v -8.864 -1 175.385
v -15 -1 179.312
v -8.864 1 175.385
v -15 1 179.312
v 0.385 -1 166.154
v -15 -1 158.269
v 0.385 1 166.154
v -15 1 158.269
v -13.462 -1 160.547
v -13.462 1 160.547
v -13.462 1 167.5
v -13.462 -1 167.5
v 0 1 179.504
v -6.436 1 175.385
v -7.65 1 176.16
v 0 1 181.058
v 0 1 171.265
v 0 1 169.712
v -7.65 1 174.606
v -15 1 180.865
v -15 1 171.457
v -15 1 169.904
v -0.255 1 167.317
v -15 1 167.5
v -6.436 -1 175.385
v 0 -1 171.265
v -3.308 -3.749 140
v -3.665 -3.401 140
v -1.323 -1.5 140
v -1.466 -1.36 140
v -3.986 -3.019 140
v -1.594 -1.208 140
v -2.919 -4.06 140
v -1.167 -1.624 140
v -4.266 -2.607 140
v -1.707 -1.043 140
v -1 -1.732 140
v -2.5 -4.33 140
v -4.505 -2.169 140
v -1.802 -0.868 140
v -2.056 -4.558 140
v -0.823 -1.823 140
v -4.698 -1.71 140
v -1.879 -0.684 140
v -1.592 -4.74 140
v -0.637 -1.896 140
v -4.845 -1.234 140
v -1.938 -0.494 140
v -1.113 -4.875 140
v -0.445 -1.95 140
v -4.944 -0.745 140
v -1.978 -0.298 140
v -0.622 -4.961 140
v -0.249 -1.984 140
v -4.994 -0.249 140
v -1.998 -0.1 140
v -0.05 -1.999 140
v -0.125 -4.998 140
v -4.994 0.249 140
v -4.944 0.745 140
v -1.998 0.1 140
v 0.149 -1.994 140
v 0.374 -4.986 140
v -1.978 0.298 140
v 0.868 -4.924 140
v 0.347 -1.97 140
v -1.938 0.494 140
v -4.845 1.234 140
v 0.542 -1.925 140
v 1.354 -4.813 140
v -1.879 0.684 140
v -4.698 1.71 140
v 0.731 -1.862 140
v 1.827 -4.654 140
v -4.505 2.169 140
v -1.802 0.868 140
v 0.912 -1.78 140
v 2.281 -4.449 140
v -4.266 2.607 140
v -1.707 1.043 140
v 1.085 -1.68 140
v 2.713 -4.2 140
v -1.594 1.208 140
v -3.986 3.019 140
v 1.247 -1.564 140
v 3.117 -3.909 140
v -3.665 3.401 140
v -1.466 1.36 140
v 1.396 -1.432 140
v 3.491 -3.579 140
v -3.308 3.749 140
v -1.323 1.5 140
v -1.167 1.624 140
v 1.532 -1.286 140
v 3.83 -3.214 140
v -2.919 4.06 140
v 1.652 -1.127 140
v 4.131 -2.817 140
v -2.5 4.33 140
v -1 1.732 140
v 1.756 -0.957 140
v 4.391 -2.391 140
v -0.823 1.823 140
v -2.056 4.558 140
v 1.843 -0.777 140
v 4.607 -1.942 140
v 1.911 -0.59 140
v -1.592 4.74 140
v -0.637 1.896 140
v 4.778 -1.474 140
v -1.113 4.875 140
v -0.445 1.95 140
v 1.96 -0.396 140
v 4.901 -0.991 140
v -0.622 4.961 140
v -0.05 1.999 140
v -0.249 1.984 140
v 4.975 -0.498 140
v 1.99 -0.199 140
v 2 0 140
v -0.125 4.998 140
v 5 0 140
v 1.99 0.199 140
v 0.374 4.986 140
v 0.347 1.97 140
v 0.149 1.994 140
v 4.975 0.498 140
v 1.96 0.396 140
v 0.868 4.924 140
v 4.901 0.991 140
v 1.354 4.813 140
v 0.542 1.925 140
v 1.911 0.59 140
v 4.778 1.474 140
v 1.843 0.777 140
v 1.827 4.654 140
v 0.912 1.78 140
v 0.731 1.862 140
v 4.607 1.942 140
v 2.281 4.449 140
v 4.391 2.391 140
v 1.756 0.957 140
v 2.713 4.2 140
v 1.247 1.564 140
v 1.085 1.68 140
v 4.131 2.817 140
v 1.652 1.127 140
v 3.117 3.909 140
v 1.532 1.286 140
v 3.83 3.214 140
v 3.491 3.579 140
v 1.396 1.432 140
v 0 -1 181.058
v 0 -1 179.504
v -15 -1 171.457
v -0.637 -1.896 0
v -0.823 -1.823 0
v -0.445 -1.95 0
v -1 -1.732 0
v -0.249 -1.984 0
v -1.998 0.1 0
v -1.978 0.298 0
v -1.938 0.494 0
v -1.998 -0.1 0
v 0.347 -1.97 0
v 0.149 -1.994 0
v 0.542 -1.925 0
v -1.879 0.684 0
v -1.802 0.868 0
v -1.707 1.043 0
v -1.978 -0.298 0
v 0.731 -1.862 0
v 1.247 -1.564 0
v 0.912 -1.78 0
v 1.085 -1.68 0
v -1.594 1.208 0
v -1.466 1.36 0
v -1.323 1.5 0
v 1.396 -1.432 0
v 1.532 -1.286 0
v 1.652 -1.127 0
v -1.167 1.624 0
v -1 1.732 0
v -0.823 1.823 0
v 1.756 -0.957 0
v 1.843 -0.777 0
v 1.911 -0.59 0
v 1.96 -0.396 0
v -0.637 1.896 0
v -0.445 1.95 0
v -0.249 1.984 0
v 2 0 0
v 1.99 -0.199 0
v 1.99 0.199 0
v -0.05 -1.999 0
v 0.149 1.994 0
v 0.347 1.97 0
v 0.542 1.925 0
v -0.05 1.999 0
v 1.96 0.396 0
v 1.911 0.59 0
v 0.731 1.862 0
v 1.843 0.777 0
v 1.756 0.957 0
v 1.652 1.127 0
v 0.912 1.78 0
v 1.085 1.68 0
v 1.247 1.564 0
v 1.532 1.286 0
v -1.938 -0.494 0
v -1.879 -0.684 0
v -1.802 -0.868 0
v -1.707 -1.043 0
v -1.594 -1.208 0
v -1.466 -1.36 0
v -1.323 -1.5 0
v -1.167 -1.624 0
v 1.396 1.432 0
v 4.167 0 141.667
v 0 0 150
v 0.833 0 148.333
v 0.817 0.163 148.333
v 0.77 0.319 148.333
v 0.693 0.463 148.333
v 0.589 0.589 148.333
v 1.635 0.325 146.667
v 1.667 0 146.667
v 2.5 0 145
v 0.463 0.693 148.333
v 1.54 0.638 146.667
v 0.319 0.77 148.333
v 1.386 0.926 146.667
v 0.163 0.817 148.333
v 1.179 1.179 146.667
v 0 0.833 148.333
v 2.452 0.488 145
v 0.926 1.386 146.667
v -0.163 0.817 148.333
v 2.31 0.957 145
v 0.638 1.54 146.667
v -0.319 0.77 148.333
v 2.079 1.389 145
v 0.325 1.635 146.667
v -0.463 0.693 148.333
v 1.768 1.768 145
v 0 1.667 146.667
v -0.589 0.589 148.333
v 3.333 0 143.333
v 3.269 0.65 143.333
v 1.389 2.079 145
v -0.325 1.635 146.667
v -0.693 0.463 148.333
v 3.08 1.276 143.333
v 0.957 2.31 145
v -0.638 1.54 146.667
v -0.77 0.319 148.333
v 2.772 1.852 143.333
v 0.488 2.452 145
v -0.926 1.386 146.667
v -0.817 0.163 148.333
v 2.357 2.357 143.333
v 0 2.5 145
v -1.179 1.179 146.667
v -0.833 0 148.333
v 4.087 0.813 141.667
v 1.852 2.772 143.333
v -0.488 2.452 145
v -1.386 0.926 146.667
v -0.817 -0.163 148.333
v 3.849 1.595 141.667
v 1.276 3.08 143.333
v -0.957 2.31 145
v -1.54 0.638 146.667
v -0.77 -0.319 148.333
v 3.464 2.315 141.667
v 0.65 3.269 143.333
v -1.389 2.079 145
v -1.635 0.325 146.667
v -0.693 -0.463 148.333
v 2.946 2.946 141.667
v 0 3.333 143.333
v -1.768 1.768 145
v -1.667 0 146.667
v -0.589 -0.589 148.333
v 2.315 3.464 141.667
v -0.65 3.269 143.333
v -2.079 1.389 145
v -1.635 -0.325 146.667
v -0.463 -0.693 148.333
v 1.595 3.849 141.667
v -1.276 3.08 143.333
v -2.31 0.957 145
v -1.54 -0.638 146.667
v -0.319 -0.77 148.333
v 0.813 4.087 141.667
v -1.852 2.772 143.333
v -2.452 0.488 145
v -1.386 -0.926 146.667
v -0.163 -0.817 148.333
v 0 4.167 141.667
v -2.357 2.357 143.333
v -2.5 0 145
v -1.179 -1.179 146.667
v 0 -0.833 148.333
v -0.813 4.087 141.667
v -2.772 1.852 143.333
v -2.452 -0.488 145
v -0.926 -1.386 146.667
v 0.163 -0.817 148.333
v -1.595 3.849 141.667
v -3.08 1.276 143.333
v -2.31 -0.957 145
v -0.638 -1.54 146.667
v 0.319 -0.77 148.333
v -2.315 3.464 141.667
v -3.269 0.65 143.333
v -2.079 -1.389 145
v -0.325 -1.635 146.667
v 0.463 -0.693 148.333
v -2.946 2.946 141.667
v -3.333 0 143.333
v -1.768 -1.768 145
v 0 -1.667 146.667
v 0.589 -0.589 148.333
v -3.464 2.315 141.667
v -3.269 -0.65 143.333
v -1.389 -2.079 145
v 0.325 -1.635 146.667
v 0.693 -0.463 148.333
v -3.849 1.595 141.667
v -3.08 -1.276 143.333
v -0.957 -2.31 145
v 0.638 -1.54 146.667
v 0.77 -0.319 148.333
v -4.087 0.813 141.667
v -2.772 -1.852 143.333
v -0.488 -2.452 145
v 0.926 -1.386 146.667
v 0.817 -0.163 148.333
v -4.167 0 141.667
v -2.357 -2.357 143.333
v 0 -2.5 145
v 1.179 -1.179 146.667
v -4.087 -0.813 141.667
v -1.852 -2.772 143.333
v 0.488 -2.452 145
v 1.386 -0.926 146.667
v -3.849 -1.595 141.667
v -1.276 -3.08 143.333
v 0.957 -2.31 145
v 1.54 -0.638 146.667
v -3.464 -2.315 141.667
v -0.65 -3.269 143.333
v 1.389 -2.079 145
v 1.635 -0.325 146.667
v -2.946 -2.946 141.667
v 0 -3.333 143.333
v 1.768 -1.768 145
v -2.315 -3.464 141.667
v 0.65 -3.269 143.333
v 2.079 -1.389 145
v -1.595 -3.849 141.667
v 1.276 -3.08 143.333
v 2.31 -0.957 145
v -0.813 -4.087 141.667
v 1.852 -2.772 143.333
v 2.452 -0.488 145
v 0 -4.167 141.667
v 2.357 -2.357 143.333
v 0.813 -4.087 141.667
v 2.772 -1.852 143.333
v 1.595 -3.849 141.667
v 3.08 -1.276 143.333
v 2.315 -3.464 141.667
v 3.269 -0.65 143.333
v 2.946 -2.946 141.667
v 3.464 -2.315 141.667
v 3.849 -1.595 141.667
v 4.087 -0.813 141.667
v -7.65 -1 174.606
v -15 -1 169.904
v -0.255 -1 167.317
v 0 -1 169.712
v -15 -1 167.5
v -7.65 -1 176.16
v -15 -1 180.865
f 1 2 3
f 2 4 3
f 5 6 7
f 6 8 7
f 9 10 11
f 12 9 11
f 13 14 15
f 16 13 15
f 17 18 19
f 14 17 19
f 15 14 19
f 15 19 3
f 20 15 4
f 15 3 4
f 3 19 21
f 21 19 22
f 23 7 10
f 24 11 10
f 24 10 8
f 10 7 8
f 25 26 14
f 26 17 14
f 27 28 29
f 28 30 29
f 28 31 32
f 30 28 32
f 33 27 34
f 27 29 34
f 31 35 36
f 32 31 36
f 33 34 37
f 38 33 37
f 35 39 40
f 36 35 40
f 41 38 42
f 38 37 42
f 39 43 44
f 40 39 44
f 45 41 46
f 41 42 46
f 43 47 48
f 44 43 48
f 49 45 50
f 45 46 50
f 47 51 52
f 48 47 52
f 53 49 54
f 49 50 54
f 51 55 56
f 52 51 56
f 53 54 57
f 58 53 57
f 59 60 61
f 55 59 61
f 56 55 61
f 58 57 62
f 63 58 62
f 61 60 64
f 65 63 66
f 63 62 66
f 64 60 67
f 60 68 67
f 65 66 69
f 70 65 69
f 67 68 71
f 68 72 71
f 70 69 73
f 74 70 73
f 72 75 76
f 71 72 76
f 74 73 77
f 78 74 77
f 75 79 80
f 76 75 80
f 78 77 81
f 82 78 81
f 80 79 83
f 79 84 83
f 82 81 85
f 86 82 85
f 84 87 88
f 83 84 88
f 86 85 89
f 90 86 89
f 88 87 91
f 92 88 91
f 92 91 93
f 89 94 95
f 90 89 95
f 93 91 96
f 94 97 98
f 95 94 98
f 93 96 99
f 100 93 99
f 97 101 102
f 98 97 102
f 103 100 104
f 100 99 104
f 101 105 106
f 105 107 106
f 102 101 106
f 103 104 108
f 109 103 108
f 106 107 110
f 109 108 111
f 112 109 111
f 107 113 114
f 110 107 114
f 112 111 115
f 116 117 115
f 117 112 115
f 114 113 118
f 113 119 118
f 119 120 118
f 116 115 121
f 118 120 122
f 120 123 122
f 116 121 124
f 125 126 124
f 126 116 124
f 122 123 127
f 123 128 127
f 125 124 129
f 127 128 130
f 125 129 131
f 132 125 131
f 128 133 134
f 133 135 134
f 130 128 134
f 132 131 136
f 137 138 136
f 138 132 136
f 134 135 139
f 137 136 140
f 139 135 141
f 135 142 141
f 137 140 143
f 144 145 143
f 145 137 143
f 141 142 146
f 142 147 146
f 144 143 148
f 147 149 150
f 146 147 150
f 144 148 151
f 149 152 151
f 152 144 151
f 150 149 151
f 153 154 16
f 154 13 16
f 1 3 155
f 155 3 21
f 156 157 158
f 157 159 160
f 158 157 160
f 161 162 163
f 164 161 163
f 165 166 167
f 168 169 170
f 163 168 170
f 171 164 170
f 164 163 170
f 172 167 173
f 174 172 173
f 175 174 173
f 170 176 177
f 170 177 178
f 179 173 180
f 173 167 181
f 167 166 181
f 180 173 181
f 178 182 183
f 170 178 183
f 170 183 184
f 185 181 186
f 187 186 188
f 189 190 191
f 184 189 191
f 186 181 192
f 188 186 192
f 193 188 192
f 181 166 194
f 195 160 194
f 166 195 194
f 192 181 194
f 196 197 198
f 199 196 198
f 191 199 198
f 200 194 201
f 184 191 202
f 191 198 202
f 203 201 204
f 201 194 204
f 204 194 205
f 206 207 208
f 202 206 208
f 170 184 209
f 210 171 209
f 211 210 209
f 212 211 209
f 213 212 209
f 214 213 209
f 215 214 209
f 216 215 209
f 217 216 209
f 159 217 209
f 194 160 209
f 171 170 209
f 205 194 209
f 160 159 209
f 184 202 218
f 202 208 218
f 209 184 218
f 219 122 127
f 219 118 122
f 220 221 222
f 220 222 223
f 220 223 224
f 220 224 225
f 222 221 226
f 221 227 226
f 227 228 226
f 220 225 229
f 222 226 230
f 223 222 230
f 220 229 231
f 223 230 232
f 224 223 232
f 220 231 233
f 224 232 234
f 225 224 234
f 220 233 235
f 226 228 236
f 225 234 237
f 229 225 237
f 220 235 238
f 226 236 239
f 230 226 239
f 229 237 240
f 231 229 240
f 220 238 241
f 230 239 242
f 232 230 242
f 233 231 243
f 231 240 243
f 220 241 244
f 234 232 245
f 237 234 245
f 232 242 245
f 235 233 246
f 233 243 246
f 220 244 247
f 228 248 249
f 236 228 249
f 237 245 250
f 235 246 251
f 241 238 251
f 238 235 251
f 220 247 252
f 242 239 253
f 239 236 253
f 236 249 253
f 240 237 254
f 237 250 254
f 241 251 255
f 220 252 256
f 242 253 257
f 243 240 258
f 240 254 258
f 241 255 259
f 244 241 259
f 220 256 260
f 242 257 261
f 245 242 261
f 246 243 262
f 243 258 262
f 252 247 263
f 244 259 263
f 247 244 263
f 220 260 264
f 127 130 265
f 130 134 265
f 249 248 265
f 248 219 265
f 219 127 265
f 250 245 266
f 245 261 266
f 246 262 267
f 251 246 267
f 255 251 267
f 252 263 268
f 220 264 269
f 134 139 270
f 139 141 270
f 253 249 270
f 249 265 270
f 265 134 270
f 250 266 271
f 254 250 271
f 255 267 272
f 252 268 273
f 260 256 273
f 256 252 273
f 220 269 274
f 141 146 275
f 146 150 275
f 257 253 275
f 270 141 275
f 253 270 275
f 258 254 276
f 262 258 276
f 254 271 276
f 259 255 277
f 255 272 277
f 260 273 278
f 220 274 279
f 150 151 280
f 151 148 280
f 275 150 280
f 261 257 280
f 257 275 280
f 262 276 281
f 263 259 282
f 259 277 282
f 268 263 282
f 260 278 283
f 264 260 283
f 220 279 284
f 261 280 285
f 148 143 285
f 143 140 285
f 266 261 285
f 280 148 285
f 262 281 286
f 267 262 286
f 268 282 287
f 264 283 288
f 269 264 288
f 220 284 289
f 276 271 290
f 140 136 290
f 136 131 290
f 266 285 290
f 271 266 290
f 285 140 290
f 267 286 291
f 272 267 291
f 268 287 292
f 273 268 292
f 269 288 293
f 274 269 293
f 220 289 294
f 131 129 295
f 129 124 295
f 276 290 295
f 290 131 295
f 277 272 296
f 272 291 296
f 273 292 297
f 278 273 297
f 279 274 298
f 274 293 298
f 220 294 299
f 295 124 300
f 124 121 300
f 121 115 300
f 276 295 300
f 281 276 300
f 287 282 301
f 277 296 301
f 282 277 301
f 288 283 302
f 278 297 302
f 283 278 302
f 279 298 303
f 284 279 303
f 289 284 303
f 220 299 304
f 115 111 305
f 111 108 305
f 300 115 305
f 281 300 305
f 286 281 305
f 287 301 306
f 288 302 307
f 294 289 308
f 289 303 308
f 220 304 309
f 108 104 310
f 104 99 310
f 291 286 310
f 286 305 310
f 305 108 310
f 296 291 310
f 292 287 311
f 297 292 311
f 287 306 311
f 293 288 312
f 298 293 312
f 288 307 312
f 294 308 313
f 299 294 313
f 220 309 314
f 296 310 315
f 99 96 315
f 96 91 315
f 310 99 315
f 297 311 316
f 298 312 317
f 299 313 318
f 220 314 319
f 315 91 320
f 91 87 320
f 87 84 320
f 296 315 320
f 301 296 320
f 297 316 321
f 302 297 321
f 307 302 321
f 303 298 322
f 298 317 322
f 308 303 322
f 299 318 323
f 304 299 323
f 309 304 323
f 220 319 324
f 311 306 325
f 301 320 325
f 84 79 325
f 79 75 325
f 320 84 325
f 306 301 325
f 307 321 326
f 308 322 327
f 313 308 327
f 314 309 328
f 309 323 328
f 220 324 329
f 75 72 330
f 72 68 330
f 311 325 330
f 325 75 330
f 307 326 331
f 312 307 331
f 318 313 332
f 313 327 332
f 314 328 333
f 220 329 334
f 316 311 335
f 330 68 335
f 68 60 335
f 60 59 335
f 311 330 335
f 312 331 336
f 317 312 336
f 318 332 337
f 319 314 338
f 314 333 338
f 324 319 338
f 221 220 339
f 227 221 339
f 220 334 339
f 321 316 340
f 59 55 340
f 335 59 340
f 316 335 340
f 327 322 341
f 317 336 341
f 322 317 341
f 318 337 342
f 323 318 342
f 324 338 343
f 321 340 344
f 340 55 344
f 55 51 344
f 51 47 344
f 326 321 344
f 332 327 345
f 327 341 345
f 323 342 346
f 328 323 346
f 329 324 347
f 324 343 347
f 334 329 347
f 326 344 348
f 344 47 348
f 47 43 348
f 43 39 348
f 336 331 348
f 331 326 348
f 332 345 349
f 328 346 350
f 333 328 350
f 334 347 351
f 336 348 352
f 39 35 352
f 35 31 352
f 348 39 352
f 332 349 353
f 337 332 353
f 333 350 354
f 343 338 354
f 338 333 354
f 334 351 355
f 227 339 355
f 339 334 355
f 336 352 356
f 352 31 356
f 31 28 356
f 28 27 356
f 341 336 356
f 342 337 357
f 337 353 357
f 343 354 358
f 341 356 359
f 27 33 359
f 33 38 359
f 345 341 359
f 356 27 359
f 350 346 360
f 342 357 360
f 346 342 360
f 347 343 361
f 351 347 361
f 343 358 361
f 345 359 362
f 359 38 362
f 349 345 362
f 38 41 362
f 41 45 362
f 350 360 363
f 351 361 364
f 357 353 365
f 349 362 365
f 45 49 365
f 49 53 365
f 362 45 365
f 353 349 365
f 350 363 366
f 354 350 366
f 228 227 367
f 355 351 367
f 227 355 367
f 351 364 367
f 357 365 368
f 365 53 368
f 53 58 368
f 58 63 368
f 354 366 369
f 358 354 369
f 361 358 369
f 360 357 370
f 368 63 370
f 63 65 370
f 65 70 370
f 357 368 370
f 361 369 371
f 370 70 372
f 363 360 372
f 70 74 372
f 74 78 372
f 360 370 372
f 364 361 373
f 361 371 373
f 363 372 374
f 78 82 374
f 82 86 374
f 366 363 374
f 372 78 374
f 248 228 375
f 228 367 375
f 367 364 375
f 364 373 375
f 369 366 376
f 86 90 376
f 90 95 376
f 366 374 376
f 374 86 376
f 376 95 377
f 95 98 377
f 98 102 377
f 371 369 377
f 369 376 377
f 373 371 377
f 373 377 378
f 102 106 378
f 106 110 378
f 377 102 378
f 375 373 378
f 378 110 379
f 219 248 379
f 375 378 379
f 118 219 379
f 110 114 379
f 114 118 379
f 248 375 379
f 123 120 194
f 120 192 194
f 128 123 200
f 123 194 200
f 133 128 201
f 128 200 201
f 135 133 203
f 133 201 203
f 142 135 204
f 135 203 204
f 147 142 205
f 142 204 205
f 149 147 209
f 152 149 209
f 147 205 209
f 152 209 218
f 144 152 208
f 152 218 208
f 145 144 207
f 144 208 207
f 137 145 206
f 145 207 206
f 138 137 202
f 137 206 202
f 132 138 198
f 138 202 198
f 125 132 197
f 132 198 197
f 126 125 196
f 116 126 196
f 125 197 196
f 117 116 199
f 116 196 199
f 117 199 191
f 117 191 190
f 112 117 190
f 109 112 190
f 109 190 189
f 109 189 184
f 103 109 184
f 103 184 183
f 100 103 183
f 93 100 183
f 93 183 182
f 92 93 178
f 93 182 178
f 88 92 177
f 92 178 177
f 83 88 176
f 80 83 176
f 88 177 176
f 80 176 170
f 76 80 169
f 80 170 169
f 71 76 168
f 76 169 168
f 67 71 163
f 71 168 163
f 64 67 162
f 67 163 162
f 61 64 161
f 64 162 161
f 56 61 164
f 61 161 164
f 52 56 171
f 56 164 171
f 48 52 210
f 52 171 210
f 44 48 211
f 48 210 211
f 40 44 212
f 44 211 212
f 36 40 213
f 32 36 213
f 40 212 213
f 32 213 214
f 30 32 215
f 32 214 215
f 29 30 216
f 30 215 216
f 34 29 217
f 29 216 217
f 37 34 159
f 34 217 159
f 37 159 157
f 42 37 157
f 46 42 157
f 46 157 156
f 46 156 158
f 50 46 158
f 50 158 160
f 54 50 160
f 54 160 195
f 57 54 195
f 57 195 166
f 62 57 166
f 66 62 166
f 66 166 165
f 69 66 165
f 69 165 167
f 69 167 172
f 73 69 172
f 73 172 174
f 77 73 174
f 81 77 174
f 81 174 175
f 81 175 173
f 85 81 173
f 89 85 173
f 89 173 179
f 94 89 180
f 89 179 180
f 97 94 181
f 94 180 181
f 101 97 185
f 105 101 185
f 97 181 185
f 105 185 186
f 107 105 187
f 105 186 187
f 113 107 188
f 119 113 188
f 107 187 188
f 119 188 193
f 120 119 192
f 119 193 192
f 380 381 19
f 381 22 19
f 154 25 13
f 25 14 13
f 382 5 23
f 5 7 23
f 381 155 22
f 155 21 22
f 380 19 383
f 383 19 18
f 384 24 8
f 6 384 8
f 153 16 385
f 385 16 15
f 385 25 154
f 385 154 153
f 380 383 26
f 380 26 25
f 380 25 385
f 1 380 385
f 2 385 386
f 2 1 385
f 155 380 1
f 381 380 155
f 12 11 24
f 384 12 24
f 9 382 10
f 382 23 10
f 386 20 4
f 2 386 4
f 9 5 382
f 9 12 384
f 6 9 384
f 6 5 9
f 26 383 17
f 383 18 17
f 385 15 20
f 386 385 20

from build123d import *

# Parameters (mm, degrees)
BOSS_EXTRUDE1_DEPTH        = 1
BOSS_EXTRUDE1_DEPTH_BACK   = 1
BOSS_EXTRUDE1_2_DEPTH      = 1
BOSS_EXTRUDE1_2_DEPTH_BACK = 1


with BuildPart() as part:
    # Sketch2 → Revolve1 (revolve)
    with BuildSketch(Plane(origin=(0, 0, 0), x_dir=(1, 0, 0), z_dir=(0, 1, 0))):
        Polygon((0, -150), (5, -140), (2, -140), (2, 0), (0, 0), align=None)
    revolve(axis=Axis((0, 0, -41.949952025), (0, 0, 1)))


with BuildPart() as body_2:
    # Sketch3 → Boss-Extrude1 (new, two sides: drawn at the far end of the back side and taken through both)
    with BuildSketch(Plane(origin=(0, 0, 0), x_dir=(1, 0, 0), z_dir=(0, 1, 0)).offset(-BOSS_EXTRUDE1_DEPTH_BACK)):
        Polygon((-15, -167.5), (-15, -158.269230769), (0.384615385, -166.153846154), (-0.255408654, -167.316706731), (-13.461538462, -160.546875), (-13.461538462, -167.5), align=None)
    extrude(amount=BOSS_EXTRUDE1_DEPTH + BOSS_EXTRUDE1_DEPTH_BACK)


with BuildPart() as body_3:
    # Sketch3 → Boss-Extrude1 2 (new, two sides: drawn at the far end of the back side and taken through both)
    with BuildSketch(Plane(origin=(0, 0, 0), x_dir=(1, 0, 0), z_dir=(0, 1, 0)).offset(-BOSS_EXTRUDE1_2_DEPTH_BACK)):
        Polygon((-15, -180.865384615), (-15, -179.311899038), (-8.864182692, -175.384615385), (-15, -171.457331731), (-15, -169.903846154), (-7.650240385, -174.606370192), (0, -169.711538462), (0, -171.265024038), (-6.436298077, -175.384615385), (0, -179.504206731), (0, -181.057692308), (-7.650240385, -176.159855769), align=None)
    extrude(amount=BOSS_EXTRUDE1_2_DEPTH + BOSS_EXTRUDE1_2_DEPTH_BACK)


solid = Compound([part.part, body_2.part, body_3.part])
